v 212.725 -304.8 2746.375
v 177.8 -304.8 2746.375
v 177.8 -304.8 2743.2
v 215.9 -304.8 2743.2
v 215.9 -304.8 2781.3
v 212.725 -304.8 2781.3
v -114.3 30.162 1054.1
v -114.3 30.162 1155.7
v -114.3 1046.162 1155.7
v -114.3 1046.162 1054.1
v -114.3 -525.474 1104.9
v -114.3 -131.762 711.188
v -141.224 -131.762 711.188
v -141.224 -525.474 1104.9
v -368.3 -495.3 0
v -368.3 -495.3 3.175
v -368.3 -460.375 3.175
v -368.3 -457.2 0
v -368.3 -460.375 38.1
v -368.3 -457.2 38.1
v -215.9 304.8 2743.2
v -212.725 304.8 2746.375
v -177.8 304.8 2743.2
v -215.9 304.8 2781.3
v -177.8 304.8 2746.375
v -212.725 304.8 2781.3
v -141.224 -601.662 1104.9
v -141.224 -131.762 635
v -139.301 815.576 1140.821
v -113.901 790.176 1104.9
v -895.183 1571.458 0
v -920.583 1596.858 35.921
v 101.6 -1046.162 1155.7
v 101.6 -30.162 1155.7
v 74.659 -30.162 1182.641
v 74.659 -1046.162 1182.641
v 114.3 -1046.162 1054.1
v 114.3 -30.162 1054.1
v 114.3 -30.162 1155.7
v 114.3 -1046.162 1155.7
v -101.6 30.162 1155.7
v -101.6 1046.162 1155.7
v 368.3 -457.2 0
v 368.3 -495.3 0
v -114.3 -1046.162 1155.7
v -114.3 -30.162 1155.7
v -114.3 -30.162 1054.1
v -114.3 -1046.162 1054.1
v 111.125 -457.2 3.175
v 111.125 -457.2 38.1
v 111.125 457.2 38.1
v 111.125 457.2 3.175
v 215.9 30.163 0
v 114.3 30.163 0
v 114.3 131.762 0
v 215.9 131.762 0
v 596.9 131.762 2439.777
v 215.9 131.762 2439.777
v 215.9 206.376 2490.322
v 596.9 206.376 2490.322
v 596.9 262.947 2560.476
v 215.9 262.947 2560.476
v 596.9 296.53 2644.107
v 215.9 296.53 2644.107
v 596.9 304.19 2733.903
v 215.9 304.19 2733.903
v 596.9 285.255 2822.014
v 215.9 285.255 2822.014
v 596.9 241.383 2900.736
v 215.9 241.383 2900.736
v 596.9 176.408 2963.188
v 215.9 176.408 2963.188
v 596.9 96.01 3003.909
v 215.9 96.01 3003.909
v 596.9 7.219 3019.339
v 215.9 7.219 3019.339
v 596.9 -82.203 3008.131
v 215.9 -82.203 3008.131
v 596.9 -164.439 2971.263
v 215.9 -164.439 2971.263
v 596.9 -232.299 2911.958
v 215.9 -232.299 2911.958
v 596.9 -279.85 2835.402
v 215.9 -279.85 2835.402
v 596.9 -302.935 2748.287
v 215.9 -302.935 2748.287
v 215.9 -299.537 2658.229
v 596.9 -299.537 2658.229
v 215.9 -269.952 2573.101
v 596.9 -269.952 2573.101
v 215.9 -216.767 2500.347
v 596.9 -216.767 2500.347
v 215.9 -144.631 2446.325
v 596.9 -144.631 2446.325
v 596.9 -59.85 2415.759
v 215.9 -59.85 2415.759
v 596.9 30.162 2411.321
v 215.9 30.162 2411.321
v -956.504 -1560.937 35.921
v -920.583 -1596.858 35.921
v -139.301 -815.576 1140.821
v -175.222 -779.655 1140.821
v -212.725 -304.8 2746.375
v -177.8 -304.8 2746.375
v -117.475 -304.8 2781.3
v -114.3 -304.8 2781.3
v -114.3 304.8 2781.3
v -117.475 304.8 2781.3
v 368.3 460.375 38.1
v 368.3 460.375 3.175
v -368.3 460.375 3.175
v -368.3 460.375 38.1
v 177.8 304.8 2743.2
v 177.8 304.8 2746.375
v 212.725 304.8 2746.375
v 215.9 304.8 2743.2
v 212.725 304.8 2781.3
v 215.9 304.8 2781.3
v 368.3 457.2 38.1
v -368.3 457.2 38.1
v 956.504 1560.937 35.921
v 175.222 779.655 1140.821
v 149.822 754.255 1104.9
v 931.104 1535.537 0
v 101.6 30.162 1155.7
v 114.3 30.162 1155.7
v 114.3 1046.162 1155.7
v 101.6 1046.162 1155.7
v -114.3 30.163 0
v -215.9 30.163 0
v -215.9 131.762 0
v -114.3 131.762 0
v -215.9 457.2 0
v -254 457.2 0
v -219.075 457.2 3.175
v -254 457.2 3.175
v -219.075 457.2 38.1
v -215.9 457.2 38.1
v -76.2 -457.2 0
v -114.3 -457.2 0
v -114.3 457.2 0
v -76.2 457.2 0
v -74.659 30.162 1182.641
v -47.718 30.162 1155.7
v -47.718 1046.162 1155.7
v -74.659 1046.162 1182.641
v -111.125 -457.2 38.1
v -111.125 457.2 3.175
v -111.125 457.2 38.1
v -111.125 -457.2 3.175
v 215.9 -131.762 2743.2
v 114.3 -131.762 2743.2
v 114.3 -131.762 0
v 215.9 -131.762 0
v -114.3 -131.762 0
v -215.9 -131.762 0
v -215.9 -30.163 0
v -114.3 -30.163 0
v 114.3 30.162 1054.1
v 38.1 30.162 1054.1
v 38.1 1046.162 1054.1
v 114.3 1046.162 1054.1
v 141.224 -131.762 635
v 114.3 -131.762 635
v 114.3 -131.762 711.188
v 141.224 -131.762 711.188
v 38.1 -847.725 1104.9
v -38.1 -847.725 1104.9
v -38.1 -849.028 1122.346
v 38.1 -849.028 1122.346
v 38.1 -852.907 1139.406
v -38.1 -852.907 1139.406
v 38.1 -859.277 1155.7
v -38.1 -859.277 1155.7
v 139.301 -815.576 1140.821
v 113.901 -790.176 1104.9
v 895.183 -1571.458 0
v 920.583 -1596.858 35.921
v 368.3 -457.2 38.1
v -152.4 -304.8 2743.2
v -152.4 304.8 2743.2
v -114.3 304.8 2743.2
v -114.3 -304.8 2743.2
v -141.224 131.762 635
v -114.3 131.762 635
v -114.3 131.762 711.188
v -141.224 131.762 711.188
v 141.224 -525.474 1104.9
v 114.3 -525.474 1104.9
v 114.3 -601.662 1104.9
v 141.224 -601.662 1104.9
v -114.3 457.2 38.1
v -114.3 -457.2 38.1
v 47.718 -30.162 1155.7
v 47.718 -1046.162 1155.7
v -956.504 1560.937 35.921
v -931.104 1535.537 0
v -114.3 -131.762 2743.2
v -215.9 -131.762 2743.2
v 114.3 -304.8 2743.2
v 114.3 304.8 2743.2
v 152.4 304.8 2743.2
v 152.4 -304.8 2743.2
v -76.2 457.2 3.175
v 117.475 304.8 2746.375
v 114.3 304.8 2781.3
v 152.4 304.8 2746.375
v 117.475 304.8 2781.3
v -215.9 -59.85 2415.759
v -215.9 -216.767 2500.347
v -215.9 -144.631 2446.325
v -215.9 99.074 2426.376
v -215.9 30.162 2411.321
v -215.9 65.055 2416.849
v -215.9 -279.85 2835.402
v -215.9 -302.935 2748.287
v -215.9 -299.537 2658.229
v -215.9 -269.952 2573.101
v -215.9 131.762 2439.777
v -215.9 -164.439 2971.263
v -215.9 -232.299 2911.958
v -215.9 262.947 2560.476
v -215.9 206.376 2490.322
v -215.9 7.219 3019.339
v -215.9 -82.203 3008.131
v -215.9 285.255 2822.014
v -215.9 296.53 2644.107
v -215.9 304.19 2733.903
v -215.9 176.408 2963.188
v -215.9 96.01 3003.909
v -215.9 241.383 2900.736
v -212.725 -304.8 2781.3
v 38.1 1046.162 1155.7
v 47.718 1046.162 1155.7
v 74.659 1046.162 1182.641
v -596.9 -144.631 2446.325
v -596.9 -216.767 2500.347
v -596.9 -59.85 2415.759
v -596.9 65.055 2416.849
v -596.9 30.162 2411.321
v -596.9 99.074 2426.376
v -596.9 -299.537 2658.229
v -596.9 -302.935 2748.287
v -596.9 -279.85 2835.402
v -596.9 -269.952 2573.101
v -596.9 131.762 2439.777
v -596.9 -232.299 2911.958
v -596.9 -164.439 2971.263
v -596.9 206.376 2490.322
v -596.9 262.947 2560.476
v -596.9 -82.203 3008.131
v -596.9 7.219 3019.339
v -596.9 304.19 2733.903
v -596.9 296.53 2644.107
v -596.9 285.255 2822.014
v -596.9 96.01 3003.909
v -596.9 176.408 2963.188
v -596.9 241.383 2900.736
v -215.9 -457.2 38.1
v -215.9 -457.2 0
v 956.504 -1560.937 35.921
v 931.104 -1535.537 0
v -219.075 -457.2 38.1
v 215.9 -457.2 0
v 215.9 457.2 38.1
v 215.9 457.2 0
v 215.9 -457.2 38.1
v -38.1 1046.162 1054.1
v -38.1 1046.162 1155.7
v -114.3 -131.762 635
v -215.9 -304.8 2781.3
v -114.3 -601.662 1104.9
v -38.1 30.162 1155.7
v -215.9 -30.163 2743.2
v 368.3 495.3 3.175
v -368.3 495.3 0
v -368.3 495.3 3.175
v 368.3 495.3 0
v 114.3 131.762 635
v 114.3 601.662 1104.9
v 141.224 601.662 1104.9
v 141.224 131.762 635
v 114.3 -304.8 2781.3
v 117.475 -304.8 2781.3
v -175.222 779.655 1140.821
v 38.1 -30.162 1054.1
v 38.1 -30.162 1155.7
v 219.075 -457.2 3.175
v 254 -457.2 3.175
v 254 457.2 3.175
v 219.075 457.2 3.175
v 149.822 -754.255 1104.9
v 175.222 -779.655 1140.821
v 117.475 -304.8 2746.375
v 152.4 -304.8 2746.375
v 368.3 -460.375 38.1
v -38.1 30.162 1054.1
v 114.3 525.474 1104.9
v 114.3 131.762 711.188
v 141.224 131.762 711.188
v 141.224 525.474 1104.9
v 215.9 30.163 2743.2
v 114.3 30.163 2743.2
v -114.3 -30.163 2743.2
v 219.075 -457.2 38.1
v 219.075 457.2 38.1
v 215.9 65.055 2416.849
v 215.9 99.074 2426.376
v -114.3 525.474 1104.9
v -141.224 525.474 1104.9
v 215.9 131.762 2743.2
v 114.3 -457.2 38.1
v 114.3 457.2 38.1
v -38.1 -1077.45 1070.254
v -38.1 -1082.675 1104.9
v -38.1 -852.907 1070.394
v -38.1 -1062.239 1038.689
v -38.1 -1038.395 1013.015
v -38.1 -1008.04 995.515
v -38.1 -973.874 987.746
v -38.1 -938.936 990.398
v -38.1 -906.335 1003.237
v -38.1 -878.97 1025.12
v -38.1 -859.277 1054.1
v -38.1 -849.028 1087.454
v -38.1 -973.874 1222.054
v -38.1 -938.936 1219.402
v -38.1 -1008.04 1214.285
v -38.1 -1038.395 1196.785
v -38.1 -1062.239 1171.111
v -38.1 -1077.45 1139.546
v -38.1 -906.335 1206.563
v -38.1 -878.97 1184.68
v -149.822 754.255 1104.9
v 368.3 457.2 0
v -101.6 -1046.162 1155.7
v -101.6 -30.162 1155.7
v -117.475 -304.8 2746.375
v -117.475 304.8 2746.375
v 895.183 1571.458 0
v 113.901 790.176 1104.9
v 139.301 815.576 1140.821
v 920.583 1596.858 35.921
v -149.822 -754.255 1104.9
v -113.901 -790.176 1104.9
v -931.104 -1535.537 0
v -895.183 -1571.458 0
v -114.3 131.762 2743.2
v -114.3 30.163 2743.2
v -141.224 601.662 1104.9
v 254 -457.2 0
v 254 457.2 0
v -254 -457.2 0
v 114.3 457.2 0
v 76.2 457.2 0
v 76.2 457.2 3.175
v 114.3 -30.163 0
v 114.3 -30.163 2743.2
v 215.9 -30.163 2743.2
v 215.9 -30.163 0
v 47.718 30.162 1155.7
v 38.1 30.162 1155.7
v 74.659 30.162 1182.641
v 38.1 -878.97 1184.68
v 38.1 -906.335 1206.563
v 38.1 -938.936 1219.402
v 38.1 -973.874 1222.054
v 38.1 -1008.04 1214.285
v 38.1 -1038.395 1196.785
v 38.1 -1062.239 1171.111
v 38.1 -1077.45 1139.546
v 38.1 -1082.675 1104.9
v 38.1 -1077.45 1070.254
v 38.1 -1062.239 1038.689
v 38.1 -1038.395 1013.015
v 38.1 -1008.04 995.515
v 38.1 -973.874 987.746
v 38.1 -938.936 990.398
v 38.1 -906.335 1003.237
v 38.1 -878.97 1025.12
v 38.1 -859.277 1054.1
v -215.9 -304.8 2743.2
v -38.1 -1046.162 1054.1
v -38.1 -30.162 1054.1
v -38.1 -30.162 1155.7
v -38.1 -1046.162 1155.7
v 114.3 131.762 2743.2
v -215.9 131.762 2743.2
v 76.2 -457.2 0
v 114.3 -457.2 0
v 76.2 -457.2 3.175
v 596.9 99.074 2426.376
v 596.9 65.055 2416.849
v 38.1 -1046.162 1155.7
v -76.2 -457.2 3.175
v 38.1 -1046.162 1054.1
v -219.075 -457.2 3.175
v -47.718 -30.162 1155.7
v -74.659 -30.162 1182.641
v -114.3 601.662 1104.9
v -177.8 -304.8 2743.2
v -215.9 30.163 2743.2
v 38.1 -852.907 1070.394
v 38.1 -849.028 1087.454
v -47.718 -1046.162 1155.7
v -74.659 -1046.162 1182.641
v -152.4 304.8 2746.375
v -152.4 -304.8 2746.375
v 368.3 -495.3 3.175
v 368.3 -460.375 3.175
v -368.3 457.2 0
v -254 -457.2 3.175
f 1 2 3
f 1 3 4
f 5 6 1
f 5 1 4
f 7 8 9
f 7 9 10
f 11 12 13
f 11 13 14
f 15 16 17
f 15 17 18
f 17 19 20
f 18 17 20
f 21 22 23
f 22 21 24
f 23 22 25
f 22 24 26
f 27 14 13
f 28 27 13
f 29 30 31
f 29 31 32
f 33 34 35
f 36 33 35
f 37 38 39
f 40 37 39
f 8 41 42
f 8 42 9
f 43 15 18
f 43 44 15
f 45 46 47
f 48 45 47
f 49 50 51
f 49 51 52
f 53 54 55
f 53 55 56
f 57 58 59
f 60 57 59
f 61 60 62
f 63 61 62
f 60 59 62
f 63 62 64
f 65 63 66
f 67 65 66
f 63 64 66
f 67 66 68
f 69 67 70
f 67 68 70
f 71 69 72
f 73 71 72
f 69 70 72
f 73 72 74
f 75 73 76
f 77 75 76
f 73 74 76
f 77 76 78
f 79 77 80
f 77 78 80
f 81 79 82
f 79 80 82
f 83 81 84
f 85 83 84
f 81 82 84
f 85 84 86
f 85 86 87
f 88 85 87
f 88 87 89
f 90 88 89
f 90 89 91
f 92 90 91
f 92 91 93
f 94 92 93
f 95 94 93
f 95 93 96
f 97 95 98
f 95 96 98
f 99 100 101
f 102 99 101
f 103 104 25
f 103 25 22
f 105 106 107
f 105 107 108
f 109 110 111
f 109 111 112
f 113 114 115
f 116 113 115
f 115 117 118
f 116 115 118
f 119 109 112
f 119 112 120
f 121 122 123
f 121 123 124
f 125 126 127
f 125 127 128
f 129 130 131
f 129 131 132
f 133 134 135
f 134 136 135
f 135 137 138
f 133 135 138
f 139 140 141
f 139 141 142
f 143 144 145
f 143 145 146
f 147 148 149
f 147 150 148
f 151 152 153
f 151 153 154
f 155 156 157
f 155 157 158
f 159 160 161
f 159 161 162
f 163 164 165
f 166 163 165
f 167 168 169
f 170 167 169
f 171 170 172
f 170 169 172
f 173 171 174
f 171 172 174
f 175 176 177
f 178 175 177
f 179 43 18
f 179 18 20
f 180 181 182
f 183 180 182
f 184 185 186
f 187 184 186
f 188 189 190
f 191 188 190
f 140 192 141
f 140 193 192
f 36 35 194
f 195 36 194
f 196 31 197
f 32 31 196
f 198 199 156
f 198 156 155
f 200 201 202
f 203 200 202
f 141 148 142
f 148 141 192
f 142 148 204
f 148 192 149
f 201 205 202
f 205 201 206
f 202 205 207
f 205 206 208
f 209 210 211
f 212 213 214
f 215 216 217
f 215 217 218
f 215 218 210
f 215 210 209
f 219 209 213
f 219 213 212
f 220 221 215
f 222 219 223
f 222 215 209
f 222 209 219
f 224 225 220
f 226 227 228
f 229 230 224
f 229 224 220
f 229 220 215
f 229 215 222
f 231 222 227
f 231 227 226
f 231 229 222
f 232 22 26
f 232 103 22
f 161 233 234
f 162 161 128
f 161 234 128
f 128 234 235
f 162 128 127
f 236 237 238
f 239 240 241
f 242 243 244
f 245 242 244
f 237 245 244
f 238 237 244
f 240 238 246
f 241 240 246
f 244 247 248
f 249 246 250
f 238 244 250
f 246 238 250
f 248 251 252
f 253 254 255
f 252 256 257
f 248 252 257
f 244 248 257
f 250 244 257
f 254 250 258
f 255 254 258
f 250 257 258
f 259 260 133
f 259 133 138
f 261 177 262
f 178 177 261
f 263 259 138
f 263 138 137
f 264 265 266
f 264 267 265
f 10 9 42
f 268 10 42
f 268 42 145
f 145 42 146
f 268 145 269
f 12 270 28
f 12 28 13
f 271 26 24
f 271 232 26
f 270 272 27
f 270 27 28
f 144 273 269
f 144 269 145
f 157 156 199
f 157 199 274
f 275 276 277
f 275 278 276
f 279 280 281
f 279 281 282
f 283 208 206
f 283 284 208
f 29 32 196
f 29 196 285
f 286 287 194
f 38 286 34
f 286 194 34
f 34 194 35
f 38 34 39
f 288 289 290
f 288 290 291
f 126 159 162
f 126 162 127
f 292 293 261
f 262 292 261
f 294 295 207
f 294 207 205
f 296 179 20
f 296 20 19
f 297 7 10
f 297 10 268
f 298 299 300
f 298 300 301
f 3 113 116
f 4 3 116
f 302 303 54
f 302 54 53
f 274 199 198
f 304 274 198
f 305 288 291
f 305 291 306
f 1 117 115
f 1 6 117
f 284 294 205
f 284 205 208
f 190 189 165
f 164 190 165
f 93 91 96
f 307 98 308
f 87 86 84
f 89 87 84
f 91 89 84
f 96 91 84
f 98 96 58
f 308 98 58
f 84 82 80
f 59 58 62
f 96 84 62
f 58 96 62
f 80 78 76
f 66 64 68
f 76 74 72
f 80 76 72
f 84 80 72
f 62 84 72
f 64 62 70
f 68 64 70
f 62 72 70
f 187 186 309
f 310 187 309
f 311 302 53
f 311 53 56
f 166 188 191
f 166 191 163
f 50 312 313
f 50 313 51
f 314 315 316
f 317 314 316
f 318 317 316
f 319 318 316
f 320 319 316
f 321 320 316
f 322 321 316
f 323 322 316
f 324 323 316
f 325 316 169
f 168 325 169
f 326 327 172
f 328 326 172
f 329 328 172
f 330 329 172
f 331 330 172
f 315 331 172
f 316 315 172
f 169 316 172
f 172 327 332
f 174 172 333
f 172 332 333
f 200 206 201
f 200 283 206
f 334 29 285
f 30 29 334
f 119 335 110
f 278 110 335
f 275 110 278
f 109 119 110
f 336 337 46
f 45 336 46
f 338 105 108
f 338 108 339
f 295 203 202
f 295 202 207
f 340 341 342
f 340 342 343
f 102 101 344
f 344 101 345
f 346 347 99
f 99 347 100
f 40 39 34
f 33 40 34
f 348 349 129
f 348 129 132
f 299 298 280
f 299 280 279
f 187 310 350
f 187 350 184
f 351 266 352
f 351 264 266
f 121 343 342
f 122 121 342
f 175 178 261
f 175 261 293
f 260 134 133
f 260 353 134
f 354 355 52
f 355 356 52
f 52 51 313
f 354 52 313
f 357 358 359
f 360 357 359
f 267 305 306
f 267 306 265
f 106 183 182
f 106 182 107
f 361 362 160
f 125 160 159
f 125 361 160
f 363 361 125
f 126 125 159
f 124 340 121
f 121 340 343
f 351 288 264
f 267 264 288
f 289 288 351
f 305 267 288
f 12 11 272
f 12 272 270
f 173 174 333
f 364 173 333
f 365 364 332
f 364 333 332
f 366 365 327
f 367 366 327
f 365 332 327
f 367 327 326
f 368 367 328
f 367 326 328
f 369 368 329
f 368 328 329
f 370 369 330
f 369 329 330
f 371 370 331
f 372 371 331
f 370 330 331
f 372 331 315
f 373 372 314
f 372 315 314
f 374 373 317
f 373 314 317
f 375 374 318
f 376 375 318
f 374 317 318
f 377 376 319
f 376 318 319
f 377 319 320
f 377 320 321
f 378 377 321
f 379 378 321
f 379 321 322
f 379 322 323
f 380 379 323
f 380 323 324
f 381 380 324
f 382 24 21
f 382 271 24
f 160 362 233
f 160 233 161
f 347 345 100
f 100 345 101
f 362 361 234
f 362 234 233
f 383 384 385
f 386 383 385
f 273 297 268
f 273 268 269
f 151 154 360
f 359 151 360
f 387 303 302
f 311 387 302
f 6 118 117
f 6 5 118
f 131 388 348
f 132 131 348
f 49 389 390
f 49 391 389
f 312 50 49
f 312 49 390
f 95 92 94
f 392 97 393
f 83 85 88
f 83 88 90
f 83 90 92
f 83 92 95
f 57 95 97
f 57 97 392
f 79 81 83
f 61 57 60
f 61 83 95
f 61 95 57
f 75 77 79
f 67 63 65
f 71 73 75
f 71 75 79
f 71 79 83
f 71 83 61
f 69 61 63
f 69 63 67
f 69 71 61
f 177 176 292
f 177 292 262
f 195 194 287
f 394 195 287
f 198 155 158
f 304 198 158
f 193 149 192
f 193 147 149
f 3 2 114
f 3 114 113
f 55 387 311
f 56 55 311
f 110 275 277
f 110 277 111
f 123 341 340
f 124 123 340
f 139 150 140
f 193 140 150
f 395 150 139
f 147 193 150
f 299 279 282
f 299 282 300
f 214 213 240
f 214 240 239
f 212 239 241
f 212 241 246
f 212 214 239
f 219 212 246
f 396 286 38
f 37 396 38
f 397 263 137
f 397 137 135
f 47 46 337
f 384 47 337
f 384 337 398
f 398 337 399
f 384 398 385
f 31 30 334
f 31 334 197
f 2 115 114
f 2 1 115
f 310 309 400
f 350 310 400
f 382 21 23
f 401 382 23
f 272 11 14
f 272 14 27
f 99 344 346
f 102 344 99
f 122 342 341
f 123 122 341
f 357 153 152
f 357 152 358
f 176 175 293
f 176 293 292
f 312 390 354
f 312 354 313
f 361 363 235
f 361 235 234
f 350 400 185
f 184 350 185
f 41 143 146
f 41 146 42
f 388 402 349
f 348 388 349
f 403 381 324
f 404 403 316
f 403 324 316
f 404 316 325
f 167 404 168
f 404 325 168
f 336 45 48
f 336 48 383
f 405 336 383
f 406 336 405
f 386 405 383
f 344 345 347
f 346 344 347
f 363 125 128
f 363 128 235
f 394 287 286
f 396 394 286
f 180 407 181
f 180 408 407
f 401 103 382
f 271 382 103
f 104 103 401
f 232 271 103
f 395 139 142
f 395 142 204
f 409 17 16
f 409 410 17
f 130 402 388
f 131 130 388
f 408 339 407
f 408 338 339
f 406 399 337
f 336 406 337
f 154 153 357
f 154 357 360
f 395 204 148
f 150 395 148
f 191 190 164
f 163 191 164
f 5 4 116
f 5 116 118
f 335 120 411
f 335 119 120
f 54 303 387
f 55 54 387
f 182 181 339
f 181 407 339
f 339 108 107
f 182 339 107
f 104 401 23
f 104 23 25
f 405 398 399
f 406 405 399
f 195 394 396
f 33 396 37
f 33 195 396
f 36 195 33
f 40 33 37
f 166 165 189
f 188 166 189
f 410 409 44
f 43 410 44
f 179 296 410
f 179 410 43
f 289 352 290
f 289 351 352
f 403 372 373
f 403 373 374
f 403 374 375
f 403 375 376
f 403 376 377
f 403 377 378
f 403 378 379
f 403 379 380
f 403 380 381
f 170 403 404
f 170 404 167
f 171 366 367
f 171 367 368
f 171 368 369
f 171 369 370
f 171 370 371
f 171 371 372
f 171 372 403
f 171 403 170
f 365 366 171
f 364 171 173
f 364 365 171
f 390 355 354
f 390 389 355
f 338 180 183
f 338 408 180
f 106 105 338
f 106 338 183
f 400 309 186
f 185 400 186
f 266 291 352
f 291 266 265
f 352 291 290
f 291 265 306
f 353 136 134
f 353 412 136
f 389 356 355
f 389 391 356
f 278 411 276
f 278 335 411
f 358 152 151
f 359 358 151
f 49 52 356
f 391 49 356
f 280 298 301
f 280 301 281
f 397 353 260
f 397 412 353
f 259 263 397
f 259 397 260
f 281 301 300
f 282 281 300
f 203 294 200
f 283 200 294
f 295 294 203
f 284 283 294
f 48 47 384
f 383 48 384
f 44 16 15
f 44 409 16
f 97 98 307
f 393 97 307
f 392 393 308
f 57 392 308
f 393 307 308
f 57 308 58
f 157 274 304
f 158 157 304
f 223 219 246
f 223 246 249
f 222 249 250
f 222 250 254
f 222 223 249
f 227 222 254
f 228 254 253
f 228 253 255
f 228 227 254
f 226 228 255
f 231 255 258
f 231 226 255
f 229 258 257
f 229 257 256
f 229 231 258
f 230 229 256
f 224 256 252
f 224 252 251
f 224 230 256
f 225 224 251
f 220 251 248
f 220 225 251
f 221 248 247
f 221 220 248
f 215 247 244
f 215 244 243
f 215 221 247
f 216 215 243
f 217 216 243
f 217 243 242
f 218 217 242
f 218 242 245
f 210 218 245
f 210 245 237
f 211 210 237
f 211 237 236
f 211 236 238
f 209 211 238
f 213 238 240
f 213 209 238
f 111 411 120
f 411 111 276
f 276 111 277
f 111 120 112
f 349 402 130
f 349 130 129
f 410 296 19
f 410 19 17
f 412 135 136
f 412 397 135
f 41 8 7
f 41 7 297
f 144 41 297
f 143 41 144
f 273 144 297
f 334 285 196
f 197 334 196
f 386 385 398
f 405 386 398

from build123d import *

# Parameters (mm, degrees)
F0_W      = 101.6
F0_H      = 101.6
F1_DEPTH  = 2743.2
F3_DEPTH  = 1016
F6_DEPTH  = 76.2
F8_DEPTH  = 26.924
F12_DEPTH = 457.2
F14_DEPTH = 368.3
F17_DEPTH = 304.8
F15_R     = 30.1625
F18_DEPTH = 381
F22_DEPTH = 50.8


with BuildPart() as f1:
    # F0 (on Top) → F1 (new body)
    with BuildSketch(Plane.XY):
        with Locations((-165.1, -80.9625)):
            Rectangle(F0_W, F0_H)
    extrude(amount=F1_DEPTH)


with BuildPart() as f1b:
    # F0 (on Top) → F1, piece 2 (new body)
    with BuildSketch(Plane.XY):
        with Locations((-165.1, 80.9625)):
            Rectangle(F0_W, F0_H)
    extrude(amount=F1_DEPTH)


with BuildPart() as f1c:
    # F0 (on Top) → F1, piece 3 (new body)
    with BuildSketch(Plane.XY):
        with Locations((165.1, 80.9625)):
            Rectangle(F0_W, F0_H)
    extrude(amount=F1_DEPTH)


with BuildPart() as f1d:
    # F0 (on Top) → F1, piece 4 (new body)
    with BuildSketch(Plane.XY):
        with Locations((165.1, -80.9625)):
            Rectangle(F0_W, F0_H)
    extrude(amount=F1_DEPTH)


with BuildPart() as f3:
    # F2 (on face) → F3 (new body)
    with BuildSketch(Plane.XZ.offset(-30.1625)):
        Polygon((-101.6, 1155.7), (-114.3, 1155.7), (-114.3, 1054.1), (-38.1, 1054.1), (-38.1, 1155.7), (-47.7184632736, 1155.7), align=None)
        Polygon((-74.6592316368, 1182.6407683632), (-101.6, 1155.7), (-47.7184632736, 1155.7), align=None)
    extrude(amount=-F3_DEPTH)


with BuildPart() as f3b:
    # F2 (on face) → F3, piece 2 (new body)
    with BuildSketch(Plane.XZ.offset(-30.1625)):
        Polygon((114.3, 1054.1), (114.3, 1155.7), (101.6, 1155.7), (47.7184632736, 1155.7), (38.1, 1155.7), (38.1, 1054.1), align=None)
        Polygon((47.7184632736, 1155.7), (101.6, 1155.7), (74.6592316368, 1182.6407683632), align=None)
    extrude(amount=-F3_DEPTH)


with BuildPart() as f4_1:
    # F4: instance of F3b
    add(f3b.part.mirror(Plane.XZ))


with BuildPart() as f4_2:
    # F4: instance of F3
    add(f3.part.mirror(Plane.XZ))


with BuildPart() as f6:
    # F5 (on face) → F6 (new body)
    with BuildSketch(Plane.YZ.offset(-38.1)):
        with BuildLine():
            ThreePointArc((-859.2767465332, 1054.1), (-850.6493347335, 1078.8515698747), (-847.725, 1104.9))
            ThreePointArc((-847.725, 1104.9), (-850.6493347335, 1130.9484301253), (-859.2767465332, 1155.7))
            Line((-859.2767465332, 1155.7), (-1046.1625, 1155.7))
            Line((-1046.1625, 1155.7), (-1046.1625, 1054.1))
            Line((-1046.1625, 1054.1), (-859.2767465332, 1054.1))
        make_face()
        with BuildLine():
            Line((-1046.1625, 1155.7), (-859.2767465332, 1155.7))
            ThreePointArc((-859.2767465332, 1155.7), (-1082.675, 1104.9), (-859.2767465332, 1054.1))
            Line((-859.2767465332, 1054.1), (-1046.1625, 1054.1))
            Line((-1046.1625, 1054.1), (-1046.1625, 1155.7))
        make_face()
    extrude(amount=F6_DEPTH)


with BuildPart() as f8:
    # F7 (on face) → F8 (new body)
    with BuildSketch(Plane.YZ.offset(114.3)):
        Polygon((-550.8625, 1054.1), (-131.7625, 635), (-131.7625, 711.1884929312), (-474.6740070688, 1054.1), align=None)
        Polygon((-601.6625, 1104.9), (-550.8625, 1054.1), (-474.6740070688, 1054.1), (-525.4740070688, 1104.9), align=None)
    extrude(amount=F8_DEPTH)


with BuildPart() as f9_1:
    # F9: instance of F8
    add(f8.part.mirror(Plane.XZ))


with BuildPart() as f10_1:
    # F10: instance of F8
    add(f8.part.mirror(Plane.YZ))


with BuildPart() as f10_2:
    # F10: instance of F9_1
    add(f9_1.part.mirror(Plane.YZ))


with BuildPart() as f12:
    # F11 (on Front) → F12 (new body, symmetric)
    with BuildSketch(Plane.XZ):
        Polygon((-254, 0), (-215.9, 0), (-215.9, 38.1), (-219.075, 38.1), (-219.075, 3.175), (-254, 3.175), align=None)
    extrude(amount=F12_DEPTH, both=True)


with BuildPart() as f12b:
    # F11 (on Front) → F12, piece 2 (new body, symmetric)
    with BuildSketch(Plane.XZ):
        Polygon((-114.3, 38.1), (-114.3, 0), (-76.2, 0), (-76.2, 3.175), (-111.125, 3.175), (-111.125, 38.1), align=None)
    extrude(amount=F12_DEPTH, both=True)


with BuildPart() as f12c:
    # F11 (on Front) → F12, piece 3 (new body, symmetric)
    with BuildSketch(Plane.XZ):
        Polygon((76.2, 0), (114.3, 0), (114.3, 38.1), (111.125, 38.1), (111.125, 3.175), (76.2, 3.175), align=None)
    extrude(amount=F12_DEPTH, both=True)


with BuildPart() as f12d:
    # F11 (on Front) → F12, piece 4 (new body, symmetric)
    with BuildSketch(Plane.XZ):
        Polygon((254, 0), (254, 3.175), (219.075, 3.175), (219.075, 38.1), (215.9, 38.1), (215.9, 0), align=None)
    extrude(amount=F12_DEPTH, both=True)


with BuildPart() as f14:
    # F13 (on Right) → F14 (new body, symmetric)
    with BuildSketch(Plane.YZ):
        Polygon((-495.3, 0), (-457.2, 0), (-457.2, 38.1), (-460.375, 38.1), (-460.375, 3.175), (-495.3, 3.175), align=None)
    extrude(amount=F14_DEPTH, both=True)


with BuildPart() as f14b:
    # F13 (on Right) → F14, piece 2 (new body, symmetric)
    with BuildSketch(Plane.YZ):
        Polygon((495.3, 0), (495.3, 3.175), (460.375, 3.175), (460.375, 38.1), (457.2, 38.1), (457.2, 0), align=None)
    extrude(amount=F14_DEPTH, both=True)


with BuildPart() as f17:
    # F16 (on Front) → F17 (new body, symmetric)
    with BuildSketch(Plane.XZ):
        Polygon((114.3, 2743.2), (152.4, 2743.2), (152.4, 2746.375), (117.475, 2746.375), (117.475, 2781.3), (114.3, 2781.3), align=None)
    extrude(amount=F17_DEPTH, both=True)


with BuildPart() as f17b:
    # F16 (on Front) → F17, piece 2 (new body, symmetric)
    with BuildSketch(Plane.XZ):
        Polygon((212.725, 2746.375), (177.8, 2746.375), (177.8, 2743.2), (215.9, 2743.2), (215.9, 2781.3), (212.725, 2781.3), align=None)
    extrude(amount=F17_DEPTH, both=True)


with BuildPart() as f17c:
    # F16 (on Front) → F17, piece 3 (new body, symmetric)
    with BuildSketch(Plane.XZ):
        Polygon((-215.9, 2781.3), (-215.9, 2743.2), (-177.8, 2743.2), (-177.8, 2746.375), (-212.725, 2746.375), (-212.725, 2781.3), align=None)
    extrude(amount=F17_DEPTH, both=True)


with BuildPart() as f17d:
    # F16 (on Front) → F17, piece 4 (new body, symmetric)
    with BuildSketch(Plane.XZ):
        Polygon((-152.4, 2743.2), (-114.3, 2743.2), (-114.3, 2781.3), (-117.475, 2781.3), (-117.475, 2746.375), (-152.4, 2746.375), align=None)
    extrude(amount=F17_DEPTH, both=True)


with BuildPart() as f18:
    # F15 (on face) → F18 (new body)
    with BuildSketch(Plane.YZ.offset(215.9)):
        with BuildLine():
            Line((30.1625, 2411.3210870781), (30.1625, 2714.625))
            Line((30.1625, 2714.625), (30.1625, 2743.2))
            Line((30.1625, 2743.2), (131.7625, 2743.2))
            Line((131.7625, 2743.2), (131.7625, 2439.7765261208))
            ThreePointArc((131.7625, 2439.7765261208), (257.9382193472, 2552.2337594727), (304.8, 2714.625))
            ThreePointArc((304.8, 2714.625), (-225.9386753081, 2919.2093469086), (30.1625, 2411.3210870781))
        make_face()
        with Locations((0, 2714.625)):
            Circle(F15_R, mode=Mode.SUBTRACT)
        with BuildLine():
            Line((30.1625, 2743.2), (30.1625, 2714.625))
            Line((30.1625, 2714.625), (30.1625, 2411.3210870781))
            ThreePointArc((30.1625, 2411.3210870781), (82.2031289491, 2421.1191472628), (131.7625, 2439.7765261208))
            Line((131.7625, 2439.7765261208), (131.7625, 2743.2))
            Line((131.7625, 2743.2), (30.1625, 2743.2))
        make_face()
        with Locations((0, 2714.625)):
            Circle(F15_R)
    extrude(amount=F18_DEPTH)


with BuildPart() as f19_1:
    # F19: instance of F18
    add(f18.part.mirror(Plane.YZ))


with BuildPart() as f22:
    # F21 (on face) → F22 (new body)
    with BuildSketch(Plane(origin=(338.1375, -338.1375, 0), x_dir=(-0.7071067812, -0.7071067812, 0), z_dir=(-0.7071067812, 0.7071067812, 0))):
        Polygon((675.199427547, 1140.8210244843), (639.2784030627, 1104.9), (1744.1784030627, 0), (1780.099427547, 35.9210244843), align=None)
    extrude(amount=F22_DEPTH)


with BuildPart() as f23_1:
    # F23: instance of F22
    add(f22.part.mirror(Plane.YZ))


with BuildPart() as f24_1:
    # F24: instance of F22
    add(f22.part.mirror(Plane.XZ))


with BuildPart() as f24_2:
    # F24: instance of F23_1
    add(f23_1.part.mirror(Plane.XZ))


solid = Compound([f1.part, f1b.part, f1c.part, f1d.part, f3.part, f3b.part, f4_1.part, f4_2.part, f6.part, f8.part, f9_1.part, f10_1.part, f10_2.part, f12.part, f12b.part, f12c.part, f12d.part, f14.part, f14b.part, f17.part, f17b.part, f17c.part, f17d.part, f18.part, f19_1.part, f22.part, f23_1.part, f24_1.part, f24_2.part])
